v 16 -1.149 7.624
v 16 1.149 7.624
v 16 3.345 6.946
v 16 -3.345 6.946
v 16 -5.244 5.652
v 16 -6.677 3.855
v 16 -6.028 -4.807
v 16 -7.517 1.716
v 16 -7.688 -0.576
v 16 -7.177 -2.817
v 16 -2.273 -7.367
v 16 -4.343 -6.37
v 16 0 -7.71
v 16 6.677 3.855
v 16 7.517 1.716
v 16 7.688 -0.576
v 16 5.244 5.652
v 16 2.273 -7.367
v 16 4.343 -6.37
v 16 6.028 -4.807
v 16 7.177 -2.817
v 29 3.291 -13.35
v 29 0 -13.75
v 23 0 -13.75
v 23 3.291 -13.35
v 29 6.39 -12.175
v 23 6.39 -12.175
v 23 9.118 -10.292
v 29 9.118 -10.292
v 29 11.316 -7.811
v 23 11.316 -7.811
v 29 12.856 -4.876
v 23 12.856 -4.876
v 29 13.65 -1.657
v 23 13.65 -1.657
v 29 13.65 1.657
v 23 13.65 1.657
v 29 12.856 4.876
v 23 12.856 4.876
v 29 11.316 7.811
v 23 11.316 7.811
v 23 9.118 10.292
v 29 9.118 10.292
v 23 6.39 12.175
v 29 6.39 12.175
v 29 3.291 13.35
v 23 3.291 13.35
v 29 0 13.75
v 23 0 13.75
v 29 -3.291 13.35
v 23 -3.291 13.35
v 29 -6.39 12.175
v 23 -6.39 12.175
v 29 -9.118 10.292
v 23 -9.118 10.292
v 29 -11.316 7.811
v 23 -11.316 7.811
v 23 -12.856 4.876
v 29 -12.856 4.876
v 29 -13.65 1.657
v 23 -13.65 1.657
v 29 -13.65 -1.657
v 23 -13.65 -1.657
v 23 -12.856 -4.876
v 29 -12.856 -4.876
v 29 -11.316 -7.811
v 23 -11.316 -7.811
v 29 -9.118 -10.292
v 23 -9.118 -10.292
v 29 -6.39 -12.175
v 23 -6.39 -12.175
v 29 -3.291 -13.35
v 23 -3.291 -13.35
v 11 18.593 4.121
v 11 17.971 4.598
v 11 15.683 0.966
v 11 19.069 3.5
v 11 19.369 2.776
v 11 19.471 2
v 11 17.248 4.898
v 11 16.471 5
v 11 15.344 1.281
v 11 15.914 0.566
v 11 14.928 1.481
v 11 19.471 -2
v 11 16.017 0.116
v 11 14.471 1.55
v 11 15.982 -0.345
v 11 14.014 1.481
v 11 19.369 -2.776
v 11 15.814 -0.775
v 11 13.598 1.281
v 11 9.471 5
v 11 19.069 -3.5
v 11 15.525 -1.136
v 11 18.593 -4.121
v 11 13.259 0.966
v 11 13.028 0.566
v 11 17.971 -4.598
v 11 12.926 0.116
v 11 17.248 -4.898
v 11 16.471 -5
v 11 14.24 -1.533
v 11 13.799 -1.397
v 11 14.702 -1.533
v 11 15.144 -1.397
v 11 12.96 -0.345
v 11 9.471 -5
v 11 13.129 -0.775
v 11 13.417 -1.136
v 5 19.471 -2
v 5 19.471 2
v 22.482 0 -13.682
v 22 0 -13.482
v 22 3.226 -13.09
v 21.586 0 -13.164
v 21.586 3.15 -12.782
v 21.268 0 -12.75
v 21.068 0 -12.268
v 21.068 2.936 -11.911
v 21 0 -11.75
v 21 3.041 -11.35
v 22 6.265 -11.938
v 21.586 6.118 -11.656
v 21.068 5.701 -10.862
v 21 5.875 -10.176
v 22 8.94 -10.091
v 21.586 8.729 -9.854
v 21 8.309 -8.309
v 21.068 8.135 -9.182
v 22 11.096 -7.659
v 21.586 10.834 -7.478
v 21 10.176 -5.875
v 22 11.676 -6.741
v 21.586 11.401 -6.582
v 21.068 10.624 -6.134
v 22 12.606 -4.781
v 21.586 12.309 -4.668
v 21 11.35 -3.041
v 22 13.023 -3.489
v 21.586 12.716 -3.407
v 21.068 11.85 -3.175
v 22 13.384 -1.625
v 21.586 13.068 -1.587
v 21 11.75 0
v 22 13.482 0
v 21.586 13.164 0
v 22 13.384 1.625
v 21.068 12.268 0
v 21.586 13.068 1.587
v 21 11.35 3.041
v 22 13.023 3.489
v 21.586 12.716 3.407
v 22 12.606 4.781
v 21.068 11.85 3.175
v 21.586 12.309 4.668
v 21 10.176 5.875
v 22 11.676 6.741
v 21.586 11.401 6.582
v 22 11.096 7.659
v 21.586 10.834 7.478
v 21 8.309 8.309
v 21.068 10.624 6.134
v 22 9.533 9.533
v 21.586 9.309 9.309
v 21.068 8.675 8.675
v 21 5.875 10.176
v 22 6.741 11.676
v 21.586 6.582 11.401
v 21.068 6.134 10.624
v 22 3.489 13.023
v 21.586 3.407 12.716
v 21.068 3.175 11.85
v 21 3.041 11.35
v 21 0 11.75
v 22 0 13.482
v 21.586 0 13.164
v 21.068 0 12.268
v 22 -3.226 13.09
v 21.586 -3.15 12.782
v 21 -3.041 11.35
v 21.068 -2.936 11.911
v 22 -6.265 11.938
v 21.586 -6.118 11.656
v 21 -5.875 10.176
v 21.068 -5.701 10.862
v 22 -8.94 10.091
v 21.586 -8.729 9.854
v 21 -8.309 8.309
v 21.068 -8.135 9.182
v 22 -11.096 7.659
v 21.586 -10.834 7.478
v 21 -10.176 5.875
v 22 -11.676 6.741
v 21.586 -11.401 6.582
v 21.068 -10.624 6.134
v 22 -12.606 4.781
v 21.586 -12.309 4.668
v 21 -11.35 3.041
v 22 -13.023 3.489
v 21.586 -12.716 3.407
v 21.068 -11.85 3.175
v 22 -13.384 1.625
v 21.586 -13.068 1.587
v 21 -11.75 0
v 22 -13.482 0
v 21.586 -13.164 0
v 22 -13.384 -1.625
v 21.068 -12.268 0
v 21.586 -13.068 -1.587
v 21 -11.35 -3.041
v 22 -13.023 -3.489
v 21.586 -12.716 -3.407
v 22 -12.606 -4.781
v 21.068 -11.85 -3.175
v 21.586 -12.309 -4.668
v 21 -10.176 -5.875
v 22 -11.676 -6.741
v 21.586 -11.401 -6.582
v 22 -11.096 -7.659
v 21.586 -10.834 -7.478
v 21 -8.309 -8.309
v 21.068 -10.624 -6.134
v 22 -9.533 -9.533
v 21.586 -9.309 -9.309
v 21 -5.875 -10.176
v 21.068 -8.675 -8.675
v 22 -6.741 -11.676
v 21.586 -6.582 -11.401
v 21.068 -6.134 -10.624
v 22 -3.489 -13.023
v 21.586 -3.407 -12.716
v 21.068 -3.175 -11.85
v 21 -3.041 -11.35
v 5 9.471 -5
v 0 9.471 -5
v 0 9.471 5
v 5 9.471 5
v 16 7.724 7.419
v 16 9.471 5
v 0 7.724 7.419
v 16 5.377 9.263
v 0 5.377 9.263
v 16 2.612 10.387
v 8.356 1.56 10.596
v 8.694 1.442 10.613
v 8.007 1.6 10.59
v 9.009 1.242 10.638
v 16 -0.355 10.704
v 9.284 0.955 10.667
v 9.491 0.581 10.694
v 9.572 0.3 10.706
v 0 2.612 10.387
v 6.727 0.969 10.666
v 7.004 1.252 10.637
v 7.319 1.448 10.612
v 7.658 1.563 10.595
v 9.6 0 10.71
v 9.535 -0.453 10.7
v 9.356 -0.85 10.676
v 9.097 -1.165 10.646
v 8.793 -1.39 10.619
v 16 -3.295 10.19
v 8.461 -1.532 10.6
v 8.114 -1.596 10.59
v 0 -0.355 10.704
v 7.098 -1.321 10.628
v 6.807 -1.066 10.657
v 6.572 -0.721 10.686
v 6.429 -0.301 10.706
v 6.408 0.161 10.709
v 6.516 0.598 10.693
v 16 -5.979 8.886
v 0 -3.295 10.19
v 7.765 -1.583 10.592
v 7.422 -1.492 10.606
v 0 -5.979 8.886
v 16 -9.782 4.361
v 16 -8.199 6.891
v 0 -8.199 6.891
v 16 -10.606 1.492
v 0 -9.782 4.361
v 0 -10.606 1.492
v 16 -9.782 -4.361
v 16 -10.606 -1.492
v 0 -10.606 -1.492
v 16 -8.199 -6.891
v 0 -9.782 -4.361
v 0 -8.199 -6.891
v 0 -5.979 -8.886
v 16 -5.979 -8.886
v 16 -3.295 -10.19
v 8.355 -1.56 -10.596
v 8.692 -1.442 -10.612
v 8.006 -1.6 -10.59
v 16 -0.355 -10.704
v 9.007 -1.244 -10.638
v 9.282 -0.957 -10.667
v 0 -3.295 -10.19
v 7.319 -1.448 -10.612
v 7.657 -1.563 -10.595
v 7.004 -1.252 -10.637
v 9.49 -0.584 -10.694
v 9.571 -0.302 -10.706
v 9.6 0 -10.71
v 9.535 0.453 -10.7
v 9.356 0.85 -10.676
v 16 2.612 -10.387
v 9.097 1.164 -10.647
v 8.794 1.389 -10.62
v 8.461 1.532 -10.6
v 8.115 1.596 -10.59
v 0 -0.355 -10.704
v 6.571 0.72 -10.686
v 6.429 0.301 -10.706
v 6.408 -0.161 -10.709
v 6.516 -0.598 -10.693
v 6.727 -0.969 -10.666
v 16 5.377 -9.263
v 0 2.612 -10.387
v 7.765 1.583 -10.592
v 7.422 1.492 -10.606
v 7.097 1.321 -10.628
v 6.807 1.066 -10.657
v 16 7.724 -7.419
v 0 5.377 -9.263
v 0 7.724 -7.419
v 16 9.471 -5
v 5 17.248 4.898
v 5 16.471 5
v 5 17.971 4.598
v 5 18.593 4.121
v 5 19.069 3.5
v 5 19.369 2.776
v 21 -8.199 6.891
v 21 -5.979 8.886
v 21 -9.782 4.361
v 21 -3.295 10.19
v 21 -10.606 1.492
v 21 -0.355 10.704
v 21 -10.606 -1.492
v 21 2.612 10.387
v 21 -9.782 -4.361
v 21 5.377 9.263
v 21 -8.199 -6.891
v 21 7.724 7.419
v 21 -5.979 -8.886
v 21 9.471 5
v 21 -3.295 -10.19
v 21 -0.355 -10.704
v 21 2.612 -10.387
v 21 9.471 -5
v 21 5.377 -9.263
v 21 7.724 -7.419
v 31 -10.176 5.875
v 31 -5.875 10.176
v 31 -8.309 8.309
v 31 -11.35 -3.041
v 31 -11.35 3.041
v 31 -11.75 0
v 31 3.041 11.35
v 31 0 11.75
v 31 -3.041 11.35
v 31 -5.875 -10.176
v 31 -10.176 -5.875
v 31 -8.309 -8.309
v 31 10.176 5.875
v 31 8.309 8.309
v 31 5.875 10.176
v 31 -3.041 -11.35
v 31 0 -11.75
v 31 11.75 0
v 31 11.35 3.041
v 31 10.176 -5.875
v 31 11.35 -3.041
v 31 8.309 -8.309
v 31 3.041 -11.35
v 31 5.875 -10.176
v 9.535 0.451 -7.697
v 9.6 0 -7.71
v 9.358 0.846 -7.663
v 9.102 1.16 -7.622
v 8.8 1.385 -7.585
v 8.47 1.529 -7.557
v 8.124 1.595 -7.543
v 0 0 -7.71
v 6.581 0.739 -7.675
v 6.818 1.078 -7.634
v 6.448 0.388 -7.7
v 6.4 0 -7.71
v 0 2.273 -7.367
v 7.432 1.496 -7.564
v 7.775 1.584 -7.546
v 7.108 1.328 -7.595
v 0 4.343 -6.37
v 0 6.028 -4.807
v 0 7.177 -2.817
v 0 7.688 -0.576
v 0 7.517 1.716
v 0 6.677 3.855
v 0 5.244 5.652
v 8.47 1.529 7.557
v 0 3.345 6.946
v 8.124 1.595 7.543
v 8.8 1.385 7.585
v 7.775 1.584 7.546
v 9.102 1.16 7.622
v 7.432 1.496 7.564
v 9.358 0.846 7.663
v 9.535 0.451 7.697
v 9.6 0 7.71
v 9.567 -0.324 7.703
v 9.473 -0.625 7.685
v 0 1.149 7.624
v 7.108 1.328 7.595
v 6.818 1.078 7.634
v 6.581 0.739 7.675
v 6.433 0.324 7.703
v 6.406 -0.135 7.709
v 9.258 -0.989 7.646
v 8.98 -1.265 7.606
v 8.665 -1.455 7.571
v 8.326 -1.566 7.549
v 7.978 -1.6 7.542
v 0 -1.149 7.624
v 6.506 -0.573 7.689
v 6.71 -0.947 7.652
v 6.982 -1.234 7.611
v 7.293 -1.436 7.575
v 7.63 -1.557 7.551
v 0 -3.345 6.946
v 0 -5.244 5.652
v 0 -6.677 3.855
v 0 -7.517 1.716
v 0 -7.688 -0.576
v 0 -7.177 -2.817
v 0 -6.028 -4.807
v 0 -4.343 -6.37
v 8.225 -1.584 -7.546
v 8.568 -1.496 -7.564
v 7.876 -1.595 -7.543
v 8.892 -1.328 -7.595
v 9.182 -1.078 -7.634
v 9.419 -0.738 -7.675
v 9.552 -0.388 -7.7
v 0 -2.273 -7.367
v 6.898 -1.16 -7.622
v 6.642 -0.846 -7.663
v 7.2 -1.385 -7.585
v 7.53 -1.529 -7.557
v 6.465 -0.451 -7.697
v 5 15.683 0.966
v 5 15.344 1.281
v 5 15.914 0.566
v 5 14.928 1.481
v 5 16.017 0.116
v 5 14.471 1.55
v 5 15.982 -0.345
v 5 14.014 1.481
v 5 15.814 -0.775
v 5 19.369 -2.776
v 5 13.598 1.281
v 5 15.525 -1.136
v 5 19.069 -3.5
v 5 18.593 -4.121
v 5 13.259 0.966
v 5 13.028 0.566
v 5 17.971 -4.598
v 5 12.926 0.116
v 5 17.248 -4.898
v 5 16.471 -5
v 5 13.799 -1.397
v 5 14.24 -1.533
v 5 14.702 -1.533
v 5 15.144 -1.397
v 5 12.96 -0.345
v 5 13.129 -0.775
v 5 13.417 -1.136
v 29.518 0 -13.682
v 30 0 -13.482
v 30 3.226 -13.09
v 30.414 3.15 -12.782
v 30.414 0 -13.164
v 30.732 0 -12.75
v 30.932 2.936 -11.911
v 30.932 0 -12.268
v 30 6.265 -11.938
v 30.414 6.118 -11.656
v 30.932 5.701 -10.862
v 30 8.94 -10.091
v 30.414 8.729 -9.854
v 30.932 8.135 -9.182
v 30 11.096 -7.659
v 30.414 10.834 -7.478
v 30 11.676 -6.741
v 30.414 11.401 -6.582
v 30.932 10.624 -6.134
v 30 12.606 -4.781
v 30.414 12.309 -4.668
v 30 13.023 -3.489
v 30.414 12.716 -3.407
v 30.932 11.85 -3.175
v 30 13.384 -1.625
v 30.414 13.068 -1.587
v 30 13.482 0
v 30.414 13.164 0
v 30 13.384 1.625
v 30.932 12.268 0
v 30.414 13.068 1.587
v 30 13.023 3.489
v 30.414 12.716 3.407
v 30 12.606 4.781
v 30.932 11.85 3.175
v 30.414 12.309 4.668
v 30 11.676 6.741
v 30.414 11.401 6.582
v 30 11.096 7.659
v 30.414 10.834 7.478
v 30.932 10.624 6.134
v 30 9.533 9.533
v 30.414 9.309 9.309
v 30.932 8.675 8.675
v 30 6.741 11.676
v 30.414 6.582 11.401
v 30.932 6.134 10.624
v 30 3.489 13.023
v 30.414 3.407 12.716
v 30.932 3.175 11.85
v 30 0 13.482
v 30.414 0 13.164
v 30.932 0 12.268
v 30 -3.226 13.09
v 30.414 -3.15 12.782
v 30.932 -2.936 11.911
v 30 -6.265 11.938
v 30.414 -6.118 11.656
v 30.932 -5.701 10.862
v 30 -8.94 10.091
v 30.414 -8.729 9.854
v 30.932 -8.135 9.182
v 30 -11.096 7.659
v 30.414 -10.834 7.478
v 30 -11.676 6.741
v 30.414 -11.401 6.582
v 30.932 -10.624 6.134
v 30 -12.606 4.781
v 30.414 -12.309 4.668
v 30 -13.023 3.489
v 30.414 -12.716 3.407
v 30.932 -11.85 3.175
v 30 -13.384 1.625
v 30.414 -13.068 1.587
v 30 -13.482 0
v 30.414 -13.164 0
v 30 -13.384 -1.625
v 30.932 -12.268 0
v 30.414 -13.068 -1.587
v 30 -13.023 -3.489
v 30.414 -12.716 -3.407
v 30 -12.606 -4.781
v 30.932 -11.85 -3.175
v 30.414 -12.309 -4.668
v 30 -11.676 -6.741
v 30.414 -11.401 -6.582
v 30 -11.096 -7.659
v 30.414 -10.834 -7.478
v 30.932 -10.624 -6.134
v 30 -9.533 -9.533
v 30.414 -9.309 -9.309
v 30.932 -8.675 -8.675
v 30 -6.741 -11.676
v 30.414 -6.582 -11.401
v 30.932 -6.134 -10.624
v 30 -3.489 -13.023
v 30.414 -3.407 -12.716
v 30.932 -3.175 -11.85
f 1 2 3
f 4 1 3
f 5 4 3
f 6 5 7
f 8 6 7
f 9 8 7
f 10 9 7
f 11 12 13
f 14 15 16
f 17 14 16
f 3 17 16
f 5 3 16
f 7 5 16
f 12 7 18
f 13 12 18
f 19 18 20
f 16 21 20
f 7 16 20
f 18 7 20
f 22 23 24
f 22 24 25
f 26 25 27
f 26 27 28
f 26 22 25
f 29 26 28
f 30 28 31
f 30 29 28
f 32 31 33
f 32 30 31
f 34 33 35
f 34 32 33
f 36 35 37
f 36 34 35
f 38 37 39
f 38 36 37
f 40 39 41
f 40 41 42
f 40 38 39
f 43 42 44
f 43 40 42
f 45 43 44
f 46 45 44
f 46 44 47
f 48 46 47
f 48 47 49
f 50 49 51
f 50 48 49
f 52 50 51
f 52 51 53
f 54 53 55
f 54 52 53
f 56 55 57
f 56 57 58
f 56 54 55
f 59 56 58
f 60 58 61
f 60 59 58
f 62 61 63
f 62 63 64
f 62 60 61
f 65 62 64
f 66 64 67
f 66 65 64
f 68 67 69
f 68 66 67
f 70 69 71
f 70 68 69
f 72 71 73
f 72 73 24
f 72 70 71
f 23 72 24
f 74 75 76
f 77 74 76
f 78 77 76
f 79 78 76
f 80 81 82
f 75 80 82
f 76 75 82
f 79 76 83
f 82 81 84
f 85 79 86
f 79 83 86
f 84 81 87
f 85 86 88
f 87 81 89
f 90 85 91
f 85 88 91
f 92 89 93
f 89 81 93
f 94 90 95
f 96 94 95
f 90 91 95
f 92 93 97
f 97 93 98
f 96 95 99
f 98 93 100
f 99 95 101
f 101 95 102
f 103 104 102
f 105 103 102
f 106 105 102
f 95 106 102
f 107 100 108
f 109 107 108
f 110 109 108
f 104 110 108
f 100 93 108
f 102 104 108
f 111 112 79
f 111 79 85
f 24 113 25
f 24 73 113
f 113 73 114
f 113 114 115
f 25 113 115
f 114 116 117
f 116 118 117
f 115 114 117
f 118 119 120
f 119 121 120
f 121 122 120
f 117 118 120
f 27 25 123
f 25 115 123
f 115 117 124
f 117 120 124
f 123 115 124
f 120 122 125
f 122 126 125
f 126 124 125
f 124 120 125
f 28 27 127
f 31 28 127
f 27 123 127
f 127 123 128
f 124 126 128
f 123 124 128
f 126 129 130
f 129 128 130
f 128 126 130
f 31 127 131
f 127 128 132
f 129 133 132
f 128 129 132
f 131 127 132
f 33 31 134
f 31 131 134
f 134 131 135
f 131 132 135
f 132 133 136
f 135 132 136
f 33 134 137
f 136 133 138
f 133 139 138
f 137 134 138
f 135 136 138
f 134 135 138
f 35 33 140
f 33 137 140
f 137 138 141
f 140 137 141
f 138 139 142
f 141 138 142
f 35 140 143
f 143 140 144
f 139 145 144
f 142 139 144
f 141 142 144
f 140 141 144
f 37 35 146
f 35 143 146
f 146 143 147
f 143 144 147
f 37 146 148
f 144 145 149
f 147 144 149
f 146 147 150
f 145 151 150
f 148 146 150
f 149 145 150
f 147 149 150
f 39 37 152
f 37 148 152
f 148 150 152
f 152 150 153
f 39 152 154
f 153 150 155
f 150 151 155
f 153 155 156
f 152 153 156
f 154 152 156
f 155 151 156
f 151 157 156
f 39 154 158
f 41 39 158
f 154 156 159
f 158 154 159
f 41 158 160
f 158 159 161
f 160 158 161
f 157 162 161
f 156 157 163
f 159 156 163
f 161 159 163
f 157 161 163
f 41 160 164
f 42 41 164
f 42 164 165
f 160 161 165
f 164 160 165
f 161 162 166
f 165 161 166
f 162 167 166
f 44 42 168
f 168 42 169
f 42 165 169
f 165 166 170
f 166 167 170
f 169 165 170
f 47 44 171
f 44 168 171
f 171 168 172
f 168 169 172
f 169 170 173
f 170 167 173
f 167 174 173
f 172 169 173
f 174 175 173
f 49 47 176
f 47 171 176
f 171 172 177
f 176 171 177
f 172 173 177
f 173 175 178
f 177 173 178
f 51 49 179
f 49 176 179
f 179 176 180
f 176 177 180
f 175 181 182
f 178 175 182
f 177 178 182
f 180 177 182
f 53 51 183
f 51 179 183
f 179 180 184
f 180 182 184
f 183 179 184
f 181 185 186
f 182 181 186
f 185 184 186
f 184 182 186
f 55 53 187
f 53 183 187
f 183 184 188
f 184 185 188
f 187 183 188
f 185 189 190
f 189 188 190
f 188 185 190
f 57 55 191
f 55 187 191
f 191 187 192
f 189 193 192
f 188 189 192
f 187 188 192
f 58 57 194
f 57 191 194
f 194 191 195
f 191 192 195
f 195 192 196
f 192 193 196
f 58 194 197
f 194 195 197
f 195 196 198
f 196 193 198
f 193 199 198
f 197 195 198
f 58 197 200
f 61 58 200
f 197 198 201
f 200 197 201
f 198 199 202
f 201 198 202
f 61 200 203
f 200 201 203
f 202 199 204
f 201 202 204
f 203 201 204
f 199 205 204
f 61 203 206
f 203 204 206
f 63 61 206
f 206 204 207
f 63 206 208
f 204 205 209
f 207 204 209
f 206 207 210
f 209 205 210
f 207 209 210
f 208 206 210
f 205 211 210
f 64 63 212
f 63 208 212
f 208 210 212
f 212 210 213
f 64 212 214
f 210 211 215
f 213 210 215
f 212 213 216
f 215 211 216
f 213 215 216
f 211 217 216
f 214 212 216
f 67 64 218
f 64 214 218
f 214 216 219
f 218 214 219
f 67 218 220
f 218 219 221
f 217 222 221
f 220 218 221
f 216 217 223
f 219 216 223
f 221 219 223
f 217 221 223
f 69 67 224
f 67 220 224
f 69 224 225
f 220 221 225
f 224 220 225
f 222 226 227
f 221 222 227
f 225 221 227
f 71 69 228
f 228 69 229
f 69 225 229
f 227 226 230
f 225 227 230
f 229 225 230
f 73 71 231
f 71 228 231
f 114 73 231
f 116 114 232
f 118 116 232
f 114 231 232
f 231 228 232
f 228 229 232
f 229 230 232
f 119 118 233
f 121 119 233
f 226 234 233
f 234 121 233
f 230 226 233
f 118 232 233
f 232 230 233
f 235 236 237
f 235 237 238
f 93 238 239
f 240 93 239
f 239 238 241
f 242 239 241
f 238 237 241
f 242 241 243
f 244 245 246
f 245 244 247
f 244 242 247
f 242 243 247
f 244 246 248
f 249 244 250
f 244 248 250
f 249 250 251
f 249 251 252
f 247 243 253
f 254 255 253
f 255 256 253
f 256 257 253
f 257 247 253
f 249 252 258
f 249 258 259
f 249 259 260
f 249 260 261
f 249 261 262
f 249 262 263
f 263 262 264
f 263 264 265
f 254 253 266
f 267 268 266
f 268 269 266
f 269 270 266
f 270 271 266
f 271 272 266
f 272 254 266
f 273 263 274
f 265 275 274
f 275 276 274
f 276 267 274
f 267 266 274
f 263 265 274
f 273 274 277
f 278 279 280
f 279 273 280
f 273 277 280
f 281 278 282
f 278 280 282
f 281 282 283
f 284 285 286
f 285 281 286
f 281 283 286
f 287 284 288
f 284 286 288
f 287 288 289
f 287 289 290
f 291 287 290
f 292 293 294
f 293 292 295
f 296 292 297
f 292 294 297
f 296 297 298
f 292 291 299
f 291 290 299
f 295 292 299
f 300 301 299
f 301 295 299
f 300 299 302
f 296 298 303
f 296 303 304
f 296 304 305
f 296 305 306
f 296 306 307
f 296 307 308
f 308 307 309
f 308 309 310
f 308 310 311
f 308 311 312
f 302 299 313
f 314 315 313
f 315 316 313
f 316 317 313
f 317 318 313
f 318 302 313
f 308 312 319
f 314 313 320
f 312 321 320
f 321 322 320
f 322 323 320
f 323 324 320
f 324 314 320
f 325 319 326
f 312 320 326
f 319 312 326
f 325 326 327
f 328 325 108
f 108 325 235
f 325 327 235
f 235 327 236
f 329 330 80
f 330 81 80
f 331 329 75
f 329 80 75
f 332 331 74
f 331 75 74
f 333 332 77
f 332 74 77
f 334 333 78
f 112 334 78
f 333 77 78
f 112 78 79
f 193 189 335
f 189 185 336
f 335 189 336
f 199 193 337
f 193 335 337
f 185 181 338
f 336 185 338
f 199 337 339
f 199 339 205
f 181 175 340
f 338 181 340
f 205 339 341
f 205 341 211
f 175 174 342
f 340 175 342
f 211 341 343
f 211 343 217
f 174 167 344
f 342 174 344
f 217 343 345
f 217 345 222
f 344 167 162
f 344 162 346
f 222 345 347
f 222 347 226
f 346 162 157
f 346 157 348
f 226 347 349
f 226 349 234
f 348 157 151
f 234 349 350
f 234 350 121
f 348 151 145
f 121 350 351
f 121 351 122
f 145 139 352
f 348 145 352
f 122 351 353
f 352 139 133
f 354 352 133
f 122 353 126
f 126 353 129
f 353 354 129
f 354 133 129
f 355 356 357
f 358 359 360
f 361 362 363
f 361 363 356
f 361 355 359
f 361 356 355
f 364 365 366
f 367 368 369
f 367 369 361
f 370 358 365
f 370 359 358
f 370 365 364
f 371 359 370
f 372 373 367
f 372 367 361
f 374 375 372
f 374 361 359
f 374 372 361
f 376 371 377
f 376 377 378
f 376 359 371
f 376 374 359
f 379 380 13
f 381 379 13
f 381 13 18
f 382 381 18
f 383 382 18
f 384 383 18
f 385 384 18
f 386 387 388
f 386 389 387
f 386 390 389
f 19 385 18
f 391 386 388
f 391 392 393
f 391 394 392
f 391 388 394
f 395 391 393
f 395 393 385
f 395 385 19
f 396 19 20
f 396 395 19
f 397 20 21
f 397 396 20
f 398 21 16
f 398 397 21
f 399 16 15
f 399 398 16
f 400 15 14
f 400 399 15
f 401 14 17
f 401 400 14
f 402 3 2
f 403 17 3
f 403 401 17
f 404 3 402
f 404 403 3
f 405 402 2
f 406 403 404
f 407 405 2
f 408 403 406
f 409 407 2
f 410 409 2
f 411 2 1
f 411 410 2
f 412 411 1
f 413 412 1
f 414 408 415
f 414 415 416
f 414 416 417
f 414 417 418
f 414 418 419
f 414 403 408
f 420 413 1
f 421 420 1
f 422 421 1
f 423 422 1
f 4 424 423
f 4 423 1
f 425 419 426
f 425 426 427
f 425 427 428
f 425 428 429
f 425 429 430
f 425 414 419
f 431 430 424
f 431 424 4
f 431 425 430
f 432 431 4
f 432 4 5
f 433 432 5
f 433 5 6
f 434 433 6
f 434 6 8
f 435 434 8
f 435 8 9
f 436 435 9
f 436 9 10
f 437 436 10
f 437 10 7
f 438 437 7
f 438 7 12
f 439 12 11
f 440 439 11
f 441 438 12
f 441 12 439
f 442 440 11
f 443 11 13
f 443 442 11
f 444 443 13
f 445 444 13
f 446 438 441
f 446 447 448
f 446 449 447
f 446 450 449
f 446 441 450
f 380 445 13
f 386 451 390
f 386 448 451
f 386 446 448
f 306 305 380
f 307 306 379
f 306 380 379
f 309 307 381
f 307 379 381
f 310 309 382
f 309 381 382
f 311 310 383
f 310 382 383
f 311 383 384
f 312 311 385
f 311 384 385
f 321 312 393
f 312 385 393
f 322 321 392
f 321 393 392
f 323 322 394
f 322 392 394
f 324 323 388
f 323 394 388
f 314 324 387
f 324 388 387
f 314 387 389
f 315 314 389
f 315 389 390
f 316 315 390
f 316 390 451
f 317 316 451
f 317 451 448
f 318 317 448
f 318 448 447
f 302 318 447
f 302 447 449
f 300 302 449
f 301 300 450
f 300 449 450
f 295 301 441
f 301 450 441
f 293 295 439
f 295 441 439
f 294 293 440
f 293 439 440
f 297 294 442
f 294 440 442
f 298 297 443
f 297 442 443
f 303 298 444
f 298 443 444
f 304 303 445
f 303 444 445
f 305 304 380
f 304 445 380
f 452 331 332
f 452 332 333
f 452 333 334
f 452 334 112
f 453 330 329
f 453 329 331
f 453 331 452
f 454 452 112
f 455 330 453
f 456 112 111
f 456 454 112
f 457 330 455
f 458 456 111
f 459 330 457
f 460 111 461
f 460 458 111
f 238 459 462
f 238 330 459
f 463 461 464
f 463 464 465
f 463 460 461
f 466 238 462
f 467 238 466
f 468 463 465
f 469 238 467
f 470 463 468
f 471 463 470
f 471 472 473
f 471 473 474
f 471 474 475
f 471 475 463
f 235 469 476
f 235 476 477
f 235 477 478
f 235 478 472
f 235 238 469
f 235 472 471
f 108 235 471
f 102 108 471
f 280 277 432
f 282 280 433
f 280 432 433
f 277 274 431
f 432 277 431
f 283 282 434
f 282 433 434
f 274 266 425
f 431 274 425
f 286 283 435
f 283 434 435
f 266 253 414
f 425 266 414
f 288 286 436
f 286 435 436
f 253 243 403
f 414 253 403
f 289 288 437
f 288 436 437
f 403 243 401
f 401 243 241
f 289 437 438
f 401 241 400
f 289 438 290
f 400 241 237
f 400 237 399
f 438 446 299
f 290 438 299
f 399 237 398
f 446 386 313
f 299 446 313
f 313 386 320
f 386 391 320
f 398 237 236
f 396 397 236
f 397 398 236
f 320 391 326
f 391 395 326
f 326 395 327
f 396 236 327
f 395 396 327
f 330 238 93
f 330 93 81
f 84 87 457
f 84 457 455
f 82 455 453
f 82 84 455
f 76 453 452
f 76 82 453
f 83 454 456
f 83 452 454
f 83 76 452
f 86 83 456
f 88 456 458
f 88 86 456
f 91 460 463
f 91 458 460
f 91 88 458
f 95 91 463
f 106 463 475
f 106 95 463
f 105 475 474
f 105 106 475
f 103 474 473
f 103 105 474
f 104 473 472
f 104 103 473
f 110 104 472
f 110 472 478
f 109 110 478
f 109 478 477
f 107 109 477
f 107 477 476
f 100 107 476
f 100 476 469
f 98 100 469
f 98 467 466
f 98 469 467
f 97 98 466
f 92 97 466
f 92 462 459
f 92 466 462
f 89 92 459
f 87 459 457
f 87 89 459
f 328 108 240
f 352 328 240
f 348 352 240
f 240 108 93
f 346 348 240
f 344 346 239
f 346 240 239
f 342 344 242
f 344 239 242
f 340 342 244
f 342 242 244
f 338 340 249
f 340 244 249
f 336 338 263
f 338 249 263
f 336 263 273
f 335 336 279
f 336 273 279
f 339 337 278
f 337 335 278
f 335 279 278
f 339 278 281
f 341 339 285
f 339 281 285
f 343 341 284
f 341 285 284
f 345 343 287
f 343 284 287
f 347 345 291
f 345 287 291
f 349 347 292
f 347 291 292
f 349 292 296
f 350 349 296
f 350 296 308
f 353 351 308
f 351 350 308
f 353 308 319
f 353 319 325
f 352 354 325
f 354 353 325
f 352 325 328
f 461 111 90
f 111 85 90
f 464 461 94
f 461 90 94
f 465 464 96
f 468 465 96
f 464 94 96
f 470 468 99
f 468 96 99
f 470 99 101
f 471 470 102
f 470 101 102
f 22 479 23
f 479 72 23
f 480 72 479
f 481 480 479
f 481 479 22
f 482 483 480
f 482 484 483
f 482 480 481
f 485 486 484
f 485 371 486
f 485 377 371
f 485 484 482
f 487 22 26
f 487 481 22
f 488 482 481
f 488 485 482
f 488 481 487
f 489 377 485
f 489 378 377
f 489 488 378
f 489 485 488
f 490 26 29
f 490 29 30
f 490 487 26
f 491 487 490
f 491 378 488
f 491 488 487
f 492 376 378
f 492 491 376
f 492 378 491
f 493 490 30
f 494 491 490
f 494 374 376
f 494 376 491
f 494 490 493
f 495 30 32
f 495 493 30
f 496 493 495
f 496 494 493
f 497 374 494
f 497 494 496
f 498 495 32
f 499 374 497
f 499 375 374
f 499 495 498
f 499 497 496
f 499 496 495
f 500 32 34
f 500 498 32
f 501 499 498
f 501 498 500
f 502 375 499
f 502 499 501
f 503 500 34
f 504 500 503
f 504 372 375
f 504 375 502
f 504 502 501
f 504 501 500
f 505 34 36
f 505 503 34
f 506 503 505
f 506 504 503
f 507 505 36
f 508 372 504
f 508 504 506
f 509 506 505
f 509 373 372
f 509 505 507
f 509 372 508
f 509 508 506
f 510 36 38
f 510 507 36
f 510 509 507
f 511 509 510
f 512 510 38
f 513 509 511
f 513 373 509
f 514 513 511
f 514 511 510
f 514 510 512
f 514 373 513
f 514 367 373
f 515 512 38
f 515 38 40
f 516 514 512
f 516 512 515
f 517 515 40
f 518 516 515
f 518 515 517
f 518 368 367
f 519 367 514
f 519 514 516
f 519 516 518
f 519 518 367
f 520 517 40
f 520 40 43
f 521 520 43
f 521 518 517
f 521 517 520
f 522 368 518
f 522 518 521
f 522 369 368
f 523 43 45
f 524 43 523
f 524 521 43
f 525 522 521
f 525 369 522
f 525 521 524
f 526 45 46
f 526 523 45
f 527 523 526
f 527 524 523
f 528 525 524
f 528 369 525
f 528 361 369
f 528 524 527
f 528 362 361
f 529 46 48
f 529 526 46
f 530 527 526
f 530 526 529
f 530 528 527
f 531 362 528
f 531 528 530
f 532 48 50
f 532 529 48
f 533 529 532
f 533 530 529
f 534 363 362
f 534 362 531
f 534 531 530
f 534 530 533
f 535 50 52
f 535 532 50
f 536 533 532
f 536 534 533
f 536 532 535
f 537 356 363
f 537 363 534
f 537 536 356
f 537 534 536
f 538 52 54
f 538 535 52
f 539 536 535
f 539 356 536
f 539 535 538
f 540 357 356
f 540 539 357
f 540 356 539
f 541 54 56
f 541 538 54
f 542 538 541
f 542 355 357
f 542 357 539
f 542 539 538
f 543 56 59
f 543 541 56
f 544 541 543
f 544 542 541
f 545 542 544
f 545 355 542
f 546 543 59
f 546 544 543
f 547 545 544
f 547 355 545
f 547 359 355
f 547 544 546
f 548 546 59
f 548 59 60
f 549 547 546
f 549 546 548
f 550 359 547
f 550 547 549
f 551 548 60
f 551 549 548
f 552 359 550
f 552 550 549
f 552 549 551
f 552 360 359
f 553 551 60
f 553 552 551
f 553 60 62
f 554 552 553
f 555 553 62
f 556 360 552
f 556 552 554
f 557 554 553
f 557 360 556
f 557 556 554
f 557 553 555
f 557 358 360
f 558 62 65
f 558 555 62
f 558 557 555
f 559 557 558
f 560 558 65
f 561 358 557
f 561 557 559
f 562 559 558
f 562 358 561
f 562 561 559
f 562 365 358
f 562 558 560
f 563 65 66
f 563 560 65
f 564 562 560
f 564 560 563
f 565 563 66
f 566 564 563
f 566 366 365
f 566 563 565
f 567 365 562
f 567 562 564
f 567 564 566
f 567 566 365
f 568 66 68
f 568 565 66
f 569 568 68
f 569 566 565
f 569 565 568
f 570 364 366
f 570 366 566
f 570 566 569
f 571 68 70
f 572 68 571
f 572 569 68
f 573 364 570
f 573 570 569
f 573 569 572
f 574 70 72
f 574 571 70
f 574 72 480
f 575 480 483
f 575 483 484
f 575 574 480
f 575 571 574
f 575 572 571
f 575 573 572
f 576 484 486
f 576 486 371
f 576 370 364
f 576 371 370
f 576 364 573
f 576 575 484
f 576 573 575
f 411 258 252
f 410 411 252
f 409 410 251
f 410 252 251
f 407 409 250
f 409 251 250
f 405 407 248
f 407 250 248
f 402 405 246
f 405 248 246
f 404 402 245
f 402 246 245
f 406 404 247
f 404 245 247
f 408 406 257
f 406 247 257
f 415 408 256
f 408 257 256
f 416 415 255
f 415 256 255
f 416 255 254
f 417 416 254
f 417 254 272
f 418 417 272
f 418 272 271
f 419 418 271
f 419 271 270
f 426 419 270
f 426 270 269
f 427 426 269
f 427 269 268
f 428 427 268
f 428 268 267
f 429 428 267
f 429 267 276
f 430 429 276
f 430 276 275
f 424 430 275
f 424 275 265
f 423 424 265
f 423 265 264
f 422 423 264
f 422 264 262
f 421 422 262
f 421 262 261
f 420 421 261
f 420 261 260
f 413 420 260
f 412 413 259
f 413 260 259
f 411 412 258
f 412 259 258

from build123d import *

# Parameters (mm, degrees)
SKETCH1_R           = 10.71
SKETCH1_R_2         = 7.71
SKETCH1_W           = 10
SKETCH1_H           = 10
BOSS_EXTRUDE1_DEPTH = 16
SKETCH2_R           = 1.55
CUT_EXTRUDE1_DEPTH  = 34.263383725
SKETCH3_R           = 1.6
CUT_EXTRUDE2_DEPTH  = 34.074839332
CUT_EXTRUDE4_START  = -10
SKETCH4_W           = 5
SKETCH4_H           = 10
CUT_EXTRUDE4_DEPTH  = 10
FILLET1_R           = 3
BOSS_EXTRUDE2_DEPTH = 15
SKETCH10_R          = 13.75
SKETCH10_R_2        = 1.5
BOSS_EXTRUDE3_DEPTH = 10
FILLET2_R           = 2


with BuildPart() as part:
    # Sketch1 → Boss-Extrude1 (new body)
    # profile 1 of 2: a face of its own
    with BuildSketch(Plane(origin=(0, 0, 0), x_dir=(0, 0, -1), z_dir=(1, 0, 0))):
        Circle(SKETCH1_R)
        Circle(SKETCH1_R_2, mode=Mode.SUBTRACT)
    # profile 2 of 2: a face of its own
    with BuildSketch(Plane(origin=(0, 0, 0), x_dir=(0, 0, -1), z_dir=(1, 0, 0))):
        with Locations((0, 14.471224842)):
            Rectangle(SKETCH1_W, SKETCH1_H)
    extrude(amount=BOSS_EXTRUDE1_DEPTH)

    # Sketch2 → Cut-Extrude1 (cut, through all)
    with BuildSketch(Plane(origin=(16, 0, 11), x_dir=(0, 0, 1), z_dir=(-1, 0, 0))):
        with Locations((-11, 14.471224842)):
            Circle(SKETCH2_R)
    extrude(amount=CUT_EXTRUDE1_DEPTH, mode=Mode.SUBTRACT)

    # Sketch3 → Cut-Extrude2 (cut, through all)
    with BuildSketch(Plane.XY.offset(10.71)):
        with Locations((8, 0)):
            Circle(SKETCH3_R)
    extrude(amount=-CUT_EXTRUDE2_DEPTH, mode=Mode.SUBTRACT)

    # Sketch4 → Cut-Extrude4 (cut)
    with BuildSketch(Plane(origin=(0, 19.471224842, 0), x_dir=(1, 0, 0), z_dir=(0, 1, 0)).offset(CUT_EXTRUDE4_START)):
        with Locations((2.5, 0)):
            Rectangle(SKETCH4_W, SKETCH4_H)
        with Locations((13.5, 0)):
            Rectangle(SKETCH4_W, SKETCH4_H)
    extrude(amount=CUT_EXTRUDE4_DEPTH, mode=Mode.SUBTRACT)

    # Fillet1
    fillet1_edges = [part.edges().sort_by_distance(p)[0] for p in [
        (8, 19.471224842, 5),
        (8, 19.471224842, -5),
    ]]
    fillet(fillet1_edges, radius=FILLET1_R)

    # Sketch8 → Boss-Extrude2 (add)
    with BuildSketch(Plane(origin=(16, 0, 0), x_dir=(0, 0, -1), z_dir=(1, 0, 0))):
        with BuildLine():
            Line((5, 9.471224842), (-5, 9.471224842))
            ThreePointArc((-5, 9.471224842), (0, -10.71), (5, 9.471224842))
        make_face()
    extrude(amount=BOSS_EXTRUDE2_DEPTH)

    # Sketch10 → Boss-Extrude3 (add)
    with BuildSketch(Plane(origin=(31, 0, 0), x_dir=(0, 0, -1), z_dir=(1, 0, 0))):
        Circle(SKETCH10_R)
        Circle(SKETCH10_R_2, mode=Mode.SUBTRACT)
    extrude(amount=-BOSS_EXTRUDE3_DEPTH)

    # Fillet2
    fillet2_edges = [part.edges().sort_by_distance(p)[0] for p in [
        (31, 0, 13.75),
        (21, 0, 13.75),
    ]]
    fillet(fillet2_edges, radius=FILLET2_R)


solid = part.part
